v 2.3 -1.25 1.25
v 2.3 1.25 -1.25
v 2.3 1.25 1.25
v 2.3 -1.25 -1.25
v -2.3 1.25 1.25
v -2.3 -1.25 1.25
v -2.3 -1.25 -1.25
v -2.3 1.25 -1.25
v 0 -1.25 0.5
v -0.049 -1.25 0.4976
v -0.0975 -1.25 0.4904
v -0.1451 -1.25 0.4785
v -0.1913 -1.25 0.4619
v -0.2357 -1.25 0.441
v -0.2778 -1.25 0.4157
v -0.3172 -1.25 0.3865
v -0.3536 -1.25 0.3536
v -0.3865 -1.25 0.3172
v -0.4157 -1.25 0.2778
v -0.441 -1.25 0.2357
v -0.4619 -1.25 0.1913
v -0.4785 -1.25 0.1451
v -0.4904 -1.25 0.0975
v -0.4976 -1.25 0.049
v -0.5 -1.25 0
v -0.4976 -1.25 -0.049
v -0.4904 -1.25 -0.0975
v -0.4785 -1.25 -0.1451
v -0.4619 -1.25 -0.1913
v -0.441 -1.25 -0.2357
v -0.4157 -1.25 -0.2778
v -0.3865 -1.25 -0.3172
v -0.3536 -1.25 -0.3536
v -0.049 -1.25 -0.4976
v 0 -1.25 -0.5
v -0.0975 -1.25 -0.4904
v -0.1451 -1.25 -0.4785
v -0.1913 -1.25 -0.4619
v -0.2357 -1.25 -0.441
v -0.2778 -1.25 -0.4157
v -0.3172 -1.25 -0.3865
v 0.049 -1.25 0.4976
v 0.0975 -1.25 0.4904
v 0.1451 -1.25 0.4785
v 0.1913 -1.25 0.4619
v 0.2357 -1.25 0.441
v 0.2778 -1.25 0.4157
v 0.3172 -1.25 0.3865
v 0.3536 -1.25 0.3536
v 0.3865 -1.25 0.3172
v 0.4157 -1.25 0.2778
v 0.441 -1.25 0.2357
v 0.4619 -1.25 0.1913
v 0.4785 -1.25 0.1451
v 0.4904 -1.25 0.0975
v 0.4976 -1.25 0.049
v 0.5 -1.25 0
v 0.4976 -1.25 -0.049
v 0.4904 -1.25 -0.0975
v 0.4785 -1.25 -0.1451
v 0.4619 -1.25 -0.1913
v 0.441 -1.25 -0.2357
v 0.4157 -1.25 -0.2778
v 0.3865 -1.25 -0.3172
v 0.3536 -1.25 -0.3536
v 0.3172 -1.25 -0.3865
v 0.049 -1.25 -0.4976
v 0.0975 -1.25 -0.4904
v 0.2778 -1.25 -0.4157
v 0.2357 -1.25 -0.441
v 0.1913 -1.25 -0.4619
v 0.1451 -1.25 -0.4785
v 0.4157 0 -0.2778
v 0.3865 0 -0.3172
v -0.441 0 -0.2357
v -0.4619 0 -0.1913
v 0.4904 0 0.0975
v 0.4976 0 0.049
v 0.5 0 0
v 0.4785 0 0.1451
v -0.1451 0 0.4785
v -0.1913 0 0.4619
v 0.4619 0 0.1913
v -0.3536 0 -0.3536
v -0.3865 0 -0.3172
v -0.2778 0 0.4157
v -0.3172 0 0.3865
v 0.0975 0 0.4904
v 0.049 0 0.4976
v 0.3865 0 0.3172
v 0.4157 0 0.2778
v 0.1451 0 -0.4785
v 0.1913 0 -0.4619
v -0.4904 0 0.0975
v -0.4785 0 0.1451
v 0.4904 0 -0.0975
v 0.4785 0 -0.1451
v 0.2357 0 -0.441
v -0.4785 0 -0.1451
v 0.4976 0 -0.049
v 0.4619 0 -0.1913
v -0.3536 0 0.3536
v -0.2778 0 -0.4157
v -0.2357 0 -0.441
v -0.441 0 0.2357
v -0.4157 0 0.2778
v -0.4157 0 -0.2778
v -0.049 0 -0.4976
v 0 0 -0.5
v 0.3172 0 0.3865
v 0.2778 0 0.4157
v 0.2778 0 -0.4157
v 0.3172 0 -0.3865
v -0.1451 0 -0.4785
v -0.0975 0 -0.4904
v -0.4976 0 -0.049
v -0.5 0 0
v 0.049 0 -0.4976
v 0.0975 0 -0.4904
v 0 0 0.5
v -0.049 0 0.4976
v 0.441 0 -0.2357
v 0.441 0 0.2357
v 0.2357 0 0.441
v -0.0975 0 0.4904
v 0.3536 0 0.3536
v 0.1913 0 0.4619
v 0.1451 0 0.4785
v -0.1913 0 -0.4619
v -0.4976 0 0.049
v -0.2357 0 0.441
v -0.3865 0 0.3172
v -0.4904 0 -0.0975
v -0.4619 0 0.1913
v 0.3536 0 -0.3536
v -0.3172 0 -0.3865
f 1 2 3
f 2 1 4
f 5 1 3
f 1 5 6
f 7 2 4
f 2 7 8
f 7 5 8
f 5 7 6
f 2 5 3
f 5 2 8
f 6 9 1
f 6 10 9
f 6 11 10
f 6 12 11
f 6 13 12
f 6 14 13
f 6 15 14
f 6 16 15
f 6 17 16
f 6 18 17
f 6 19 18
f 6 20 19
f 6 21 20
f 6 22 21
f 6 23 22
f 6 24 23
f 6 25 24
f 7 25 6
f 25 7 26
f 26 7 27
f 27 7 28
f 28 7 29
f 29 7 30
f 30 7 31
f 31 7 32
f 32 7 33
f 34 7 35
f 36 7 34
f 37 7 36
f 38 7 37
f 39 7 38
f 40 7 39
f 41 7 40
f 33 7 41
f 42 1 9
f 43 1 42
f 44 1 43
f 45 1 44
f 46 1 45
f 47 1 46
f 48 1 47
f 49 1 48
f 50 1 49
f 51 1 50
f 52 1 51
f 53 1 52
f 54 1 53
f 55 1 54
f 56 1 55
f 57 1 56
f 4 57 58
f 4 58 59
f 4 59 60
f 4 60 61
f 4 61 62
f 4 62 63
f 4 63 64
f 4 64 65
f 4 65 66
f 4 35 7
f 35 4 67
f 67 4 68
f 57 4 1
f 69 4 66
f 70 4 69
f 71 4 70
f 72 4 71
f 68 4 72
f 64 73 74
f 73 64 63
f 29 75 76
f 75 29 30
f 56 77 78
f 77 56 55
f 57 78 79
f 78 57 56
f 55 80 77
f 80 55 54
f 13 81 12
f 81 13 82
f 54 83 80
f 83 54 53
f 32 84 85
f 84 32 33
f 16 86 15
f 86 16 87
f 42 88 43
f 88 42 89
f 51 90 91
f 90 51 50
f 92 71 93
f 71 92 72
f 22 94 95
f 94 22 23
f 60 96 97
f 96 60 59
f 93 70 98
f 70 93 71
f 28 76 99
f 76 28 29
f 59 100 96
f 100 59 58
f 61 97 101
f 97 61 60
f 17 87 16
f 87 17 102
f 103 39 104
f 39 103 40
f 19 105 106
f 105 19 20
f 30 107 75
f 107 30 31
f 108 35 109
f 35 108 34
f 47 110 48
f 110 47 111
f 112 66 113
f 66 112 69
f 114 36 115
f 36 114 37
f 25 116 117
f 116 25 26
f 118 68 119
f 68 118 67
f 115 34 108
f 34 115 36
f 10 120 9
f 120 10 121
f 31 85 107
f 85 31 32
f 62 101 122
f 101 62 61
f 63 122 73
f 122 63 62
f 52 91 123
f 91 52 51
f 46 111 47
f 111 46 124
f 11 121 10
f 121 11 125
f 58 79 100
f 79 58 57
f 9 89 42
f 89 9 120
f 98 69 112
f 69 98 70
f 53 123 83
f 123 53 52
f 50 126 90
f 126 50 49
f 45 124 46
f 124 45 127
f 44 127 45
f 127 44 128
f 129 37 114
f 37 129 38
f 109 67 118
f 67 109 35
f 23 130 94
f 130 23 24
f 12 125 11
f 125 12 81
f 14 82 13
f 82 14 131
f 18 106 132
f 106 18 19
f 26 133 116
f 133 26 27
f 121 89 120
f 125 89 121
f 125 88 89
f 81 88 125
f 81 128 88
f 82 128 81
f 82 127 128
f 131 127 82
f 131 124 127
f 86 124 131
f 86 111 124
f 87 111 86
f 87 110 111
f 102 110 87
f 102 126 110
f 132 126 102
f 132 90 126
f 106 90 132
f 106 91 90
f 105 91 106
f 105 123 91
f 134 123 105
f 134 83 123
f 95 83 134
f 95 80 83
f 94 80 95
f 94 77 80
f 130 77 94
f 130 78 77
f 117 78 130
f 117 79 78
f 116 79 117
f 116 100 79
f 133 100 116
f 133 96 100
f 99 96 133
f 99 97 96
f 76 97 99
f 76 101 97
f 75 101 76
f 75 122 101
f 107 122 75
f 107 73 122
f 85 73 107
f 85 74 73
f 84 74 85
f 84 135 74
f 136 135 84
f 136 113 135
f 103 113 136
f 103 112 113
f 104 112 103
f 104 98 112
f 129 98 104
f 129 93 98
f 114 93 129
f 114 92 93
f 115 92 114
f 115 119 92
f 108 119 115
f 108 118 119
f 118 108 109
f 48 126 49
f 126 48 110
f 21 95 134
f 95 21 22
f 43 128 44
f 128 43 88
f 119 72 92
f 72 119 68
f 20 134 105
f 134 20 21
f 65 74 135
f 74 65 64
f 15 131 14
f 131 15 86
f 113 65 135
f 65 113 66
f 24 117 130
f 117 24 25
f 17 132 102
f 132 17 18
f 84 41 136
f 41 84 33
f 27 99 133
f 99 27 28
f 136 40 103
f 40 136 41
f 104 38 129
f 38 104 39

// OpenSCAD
translate([-2.3, -1.25, -1.25])
difference() {
    cube([4.6, 2.5, 2.5]);
    translate([2.3, 1.25, 1.25])
    rotate([90, 0, 0])
    cylinder(h=4.6, r=0.5, $fn=64);
}
